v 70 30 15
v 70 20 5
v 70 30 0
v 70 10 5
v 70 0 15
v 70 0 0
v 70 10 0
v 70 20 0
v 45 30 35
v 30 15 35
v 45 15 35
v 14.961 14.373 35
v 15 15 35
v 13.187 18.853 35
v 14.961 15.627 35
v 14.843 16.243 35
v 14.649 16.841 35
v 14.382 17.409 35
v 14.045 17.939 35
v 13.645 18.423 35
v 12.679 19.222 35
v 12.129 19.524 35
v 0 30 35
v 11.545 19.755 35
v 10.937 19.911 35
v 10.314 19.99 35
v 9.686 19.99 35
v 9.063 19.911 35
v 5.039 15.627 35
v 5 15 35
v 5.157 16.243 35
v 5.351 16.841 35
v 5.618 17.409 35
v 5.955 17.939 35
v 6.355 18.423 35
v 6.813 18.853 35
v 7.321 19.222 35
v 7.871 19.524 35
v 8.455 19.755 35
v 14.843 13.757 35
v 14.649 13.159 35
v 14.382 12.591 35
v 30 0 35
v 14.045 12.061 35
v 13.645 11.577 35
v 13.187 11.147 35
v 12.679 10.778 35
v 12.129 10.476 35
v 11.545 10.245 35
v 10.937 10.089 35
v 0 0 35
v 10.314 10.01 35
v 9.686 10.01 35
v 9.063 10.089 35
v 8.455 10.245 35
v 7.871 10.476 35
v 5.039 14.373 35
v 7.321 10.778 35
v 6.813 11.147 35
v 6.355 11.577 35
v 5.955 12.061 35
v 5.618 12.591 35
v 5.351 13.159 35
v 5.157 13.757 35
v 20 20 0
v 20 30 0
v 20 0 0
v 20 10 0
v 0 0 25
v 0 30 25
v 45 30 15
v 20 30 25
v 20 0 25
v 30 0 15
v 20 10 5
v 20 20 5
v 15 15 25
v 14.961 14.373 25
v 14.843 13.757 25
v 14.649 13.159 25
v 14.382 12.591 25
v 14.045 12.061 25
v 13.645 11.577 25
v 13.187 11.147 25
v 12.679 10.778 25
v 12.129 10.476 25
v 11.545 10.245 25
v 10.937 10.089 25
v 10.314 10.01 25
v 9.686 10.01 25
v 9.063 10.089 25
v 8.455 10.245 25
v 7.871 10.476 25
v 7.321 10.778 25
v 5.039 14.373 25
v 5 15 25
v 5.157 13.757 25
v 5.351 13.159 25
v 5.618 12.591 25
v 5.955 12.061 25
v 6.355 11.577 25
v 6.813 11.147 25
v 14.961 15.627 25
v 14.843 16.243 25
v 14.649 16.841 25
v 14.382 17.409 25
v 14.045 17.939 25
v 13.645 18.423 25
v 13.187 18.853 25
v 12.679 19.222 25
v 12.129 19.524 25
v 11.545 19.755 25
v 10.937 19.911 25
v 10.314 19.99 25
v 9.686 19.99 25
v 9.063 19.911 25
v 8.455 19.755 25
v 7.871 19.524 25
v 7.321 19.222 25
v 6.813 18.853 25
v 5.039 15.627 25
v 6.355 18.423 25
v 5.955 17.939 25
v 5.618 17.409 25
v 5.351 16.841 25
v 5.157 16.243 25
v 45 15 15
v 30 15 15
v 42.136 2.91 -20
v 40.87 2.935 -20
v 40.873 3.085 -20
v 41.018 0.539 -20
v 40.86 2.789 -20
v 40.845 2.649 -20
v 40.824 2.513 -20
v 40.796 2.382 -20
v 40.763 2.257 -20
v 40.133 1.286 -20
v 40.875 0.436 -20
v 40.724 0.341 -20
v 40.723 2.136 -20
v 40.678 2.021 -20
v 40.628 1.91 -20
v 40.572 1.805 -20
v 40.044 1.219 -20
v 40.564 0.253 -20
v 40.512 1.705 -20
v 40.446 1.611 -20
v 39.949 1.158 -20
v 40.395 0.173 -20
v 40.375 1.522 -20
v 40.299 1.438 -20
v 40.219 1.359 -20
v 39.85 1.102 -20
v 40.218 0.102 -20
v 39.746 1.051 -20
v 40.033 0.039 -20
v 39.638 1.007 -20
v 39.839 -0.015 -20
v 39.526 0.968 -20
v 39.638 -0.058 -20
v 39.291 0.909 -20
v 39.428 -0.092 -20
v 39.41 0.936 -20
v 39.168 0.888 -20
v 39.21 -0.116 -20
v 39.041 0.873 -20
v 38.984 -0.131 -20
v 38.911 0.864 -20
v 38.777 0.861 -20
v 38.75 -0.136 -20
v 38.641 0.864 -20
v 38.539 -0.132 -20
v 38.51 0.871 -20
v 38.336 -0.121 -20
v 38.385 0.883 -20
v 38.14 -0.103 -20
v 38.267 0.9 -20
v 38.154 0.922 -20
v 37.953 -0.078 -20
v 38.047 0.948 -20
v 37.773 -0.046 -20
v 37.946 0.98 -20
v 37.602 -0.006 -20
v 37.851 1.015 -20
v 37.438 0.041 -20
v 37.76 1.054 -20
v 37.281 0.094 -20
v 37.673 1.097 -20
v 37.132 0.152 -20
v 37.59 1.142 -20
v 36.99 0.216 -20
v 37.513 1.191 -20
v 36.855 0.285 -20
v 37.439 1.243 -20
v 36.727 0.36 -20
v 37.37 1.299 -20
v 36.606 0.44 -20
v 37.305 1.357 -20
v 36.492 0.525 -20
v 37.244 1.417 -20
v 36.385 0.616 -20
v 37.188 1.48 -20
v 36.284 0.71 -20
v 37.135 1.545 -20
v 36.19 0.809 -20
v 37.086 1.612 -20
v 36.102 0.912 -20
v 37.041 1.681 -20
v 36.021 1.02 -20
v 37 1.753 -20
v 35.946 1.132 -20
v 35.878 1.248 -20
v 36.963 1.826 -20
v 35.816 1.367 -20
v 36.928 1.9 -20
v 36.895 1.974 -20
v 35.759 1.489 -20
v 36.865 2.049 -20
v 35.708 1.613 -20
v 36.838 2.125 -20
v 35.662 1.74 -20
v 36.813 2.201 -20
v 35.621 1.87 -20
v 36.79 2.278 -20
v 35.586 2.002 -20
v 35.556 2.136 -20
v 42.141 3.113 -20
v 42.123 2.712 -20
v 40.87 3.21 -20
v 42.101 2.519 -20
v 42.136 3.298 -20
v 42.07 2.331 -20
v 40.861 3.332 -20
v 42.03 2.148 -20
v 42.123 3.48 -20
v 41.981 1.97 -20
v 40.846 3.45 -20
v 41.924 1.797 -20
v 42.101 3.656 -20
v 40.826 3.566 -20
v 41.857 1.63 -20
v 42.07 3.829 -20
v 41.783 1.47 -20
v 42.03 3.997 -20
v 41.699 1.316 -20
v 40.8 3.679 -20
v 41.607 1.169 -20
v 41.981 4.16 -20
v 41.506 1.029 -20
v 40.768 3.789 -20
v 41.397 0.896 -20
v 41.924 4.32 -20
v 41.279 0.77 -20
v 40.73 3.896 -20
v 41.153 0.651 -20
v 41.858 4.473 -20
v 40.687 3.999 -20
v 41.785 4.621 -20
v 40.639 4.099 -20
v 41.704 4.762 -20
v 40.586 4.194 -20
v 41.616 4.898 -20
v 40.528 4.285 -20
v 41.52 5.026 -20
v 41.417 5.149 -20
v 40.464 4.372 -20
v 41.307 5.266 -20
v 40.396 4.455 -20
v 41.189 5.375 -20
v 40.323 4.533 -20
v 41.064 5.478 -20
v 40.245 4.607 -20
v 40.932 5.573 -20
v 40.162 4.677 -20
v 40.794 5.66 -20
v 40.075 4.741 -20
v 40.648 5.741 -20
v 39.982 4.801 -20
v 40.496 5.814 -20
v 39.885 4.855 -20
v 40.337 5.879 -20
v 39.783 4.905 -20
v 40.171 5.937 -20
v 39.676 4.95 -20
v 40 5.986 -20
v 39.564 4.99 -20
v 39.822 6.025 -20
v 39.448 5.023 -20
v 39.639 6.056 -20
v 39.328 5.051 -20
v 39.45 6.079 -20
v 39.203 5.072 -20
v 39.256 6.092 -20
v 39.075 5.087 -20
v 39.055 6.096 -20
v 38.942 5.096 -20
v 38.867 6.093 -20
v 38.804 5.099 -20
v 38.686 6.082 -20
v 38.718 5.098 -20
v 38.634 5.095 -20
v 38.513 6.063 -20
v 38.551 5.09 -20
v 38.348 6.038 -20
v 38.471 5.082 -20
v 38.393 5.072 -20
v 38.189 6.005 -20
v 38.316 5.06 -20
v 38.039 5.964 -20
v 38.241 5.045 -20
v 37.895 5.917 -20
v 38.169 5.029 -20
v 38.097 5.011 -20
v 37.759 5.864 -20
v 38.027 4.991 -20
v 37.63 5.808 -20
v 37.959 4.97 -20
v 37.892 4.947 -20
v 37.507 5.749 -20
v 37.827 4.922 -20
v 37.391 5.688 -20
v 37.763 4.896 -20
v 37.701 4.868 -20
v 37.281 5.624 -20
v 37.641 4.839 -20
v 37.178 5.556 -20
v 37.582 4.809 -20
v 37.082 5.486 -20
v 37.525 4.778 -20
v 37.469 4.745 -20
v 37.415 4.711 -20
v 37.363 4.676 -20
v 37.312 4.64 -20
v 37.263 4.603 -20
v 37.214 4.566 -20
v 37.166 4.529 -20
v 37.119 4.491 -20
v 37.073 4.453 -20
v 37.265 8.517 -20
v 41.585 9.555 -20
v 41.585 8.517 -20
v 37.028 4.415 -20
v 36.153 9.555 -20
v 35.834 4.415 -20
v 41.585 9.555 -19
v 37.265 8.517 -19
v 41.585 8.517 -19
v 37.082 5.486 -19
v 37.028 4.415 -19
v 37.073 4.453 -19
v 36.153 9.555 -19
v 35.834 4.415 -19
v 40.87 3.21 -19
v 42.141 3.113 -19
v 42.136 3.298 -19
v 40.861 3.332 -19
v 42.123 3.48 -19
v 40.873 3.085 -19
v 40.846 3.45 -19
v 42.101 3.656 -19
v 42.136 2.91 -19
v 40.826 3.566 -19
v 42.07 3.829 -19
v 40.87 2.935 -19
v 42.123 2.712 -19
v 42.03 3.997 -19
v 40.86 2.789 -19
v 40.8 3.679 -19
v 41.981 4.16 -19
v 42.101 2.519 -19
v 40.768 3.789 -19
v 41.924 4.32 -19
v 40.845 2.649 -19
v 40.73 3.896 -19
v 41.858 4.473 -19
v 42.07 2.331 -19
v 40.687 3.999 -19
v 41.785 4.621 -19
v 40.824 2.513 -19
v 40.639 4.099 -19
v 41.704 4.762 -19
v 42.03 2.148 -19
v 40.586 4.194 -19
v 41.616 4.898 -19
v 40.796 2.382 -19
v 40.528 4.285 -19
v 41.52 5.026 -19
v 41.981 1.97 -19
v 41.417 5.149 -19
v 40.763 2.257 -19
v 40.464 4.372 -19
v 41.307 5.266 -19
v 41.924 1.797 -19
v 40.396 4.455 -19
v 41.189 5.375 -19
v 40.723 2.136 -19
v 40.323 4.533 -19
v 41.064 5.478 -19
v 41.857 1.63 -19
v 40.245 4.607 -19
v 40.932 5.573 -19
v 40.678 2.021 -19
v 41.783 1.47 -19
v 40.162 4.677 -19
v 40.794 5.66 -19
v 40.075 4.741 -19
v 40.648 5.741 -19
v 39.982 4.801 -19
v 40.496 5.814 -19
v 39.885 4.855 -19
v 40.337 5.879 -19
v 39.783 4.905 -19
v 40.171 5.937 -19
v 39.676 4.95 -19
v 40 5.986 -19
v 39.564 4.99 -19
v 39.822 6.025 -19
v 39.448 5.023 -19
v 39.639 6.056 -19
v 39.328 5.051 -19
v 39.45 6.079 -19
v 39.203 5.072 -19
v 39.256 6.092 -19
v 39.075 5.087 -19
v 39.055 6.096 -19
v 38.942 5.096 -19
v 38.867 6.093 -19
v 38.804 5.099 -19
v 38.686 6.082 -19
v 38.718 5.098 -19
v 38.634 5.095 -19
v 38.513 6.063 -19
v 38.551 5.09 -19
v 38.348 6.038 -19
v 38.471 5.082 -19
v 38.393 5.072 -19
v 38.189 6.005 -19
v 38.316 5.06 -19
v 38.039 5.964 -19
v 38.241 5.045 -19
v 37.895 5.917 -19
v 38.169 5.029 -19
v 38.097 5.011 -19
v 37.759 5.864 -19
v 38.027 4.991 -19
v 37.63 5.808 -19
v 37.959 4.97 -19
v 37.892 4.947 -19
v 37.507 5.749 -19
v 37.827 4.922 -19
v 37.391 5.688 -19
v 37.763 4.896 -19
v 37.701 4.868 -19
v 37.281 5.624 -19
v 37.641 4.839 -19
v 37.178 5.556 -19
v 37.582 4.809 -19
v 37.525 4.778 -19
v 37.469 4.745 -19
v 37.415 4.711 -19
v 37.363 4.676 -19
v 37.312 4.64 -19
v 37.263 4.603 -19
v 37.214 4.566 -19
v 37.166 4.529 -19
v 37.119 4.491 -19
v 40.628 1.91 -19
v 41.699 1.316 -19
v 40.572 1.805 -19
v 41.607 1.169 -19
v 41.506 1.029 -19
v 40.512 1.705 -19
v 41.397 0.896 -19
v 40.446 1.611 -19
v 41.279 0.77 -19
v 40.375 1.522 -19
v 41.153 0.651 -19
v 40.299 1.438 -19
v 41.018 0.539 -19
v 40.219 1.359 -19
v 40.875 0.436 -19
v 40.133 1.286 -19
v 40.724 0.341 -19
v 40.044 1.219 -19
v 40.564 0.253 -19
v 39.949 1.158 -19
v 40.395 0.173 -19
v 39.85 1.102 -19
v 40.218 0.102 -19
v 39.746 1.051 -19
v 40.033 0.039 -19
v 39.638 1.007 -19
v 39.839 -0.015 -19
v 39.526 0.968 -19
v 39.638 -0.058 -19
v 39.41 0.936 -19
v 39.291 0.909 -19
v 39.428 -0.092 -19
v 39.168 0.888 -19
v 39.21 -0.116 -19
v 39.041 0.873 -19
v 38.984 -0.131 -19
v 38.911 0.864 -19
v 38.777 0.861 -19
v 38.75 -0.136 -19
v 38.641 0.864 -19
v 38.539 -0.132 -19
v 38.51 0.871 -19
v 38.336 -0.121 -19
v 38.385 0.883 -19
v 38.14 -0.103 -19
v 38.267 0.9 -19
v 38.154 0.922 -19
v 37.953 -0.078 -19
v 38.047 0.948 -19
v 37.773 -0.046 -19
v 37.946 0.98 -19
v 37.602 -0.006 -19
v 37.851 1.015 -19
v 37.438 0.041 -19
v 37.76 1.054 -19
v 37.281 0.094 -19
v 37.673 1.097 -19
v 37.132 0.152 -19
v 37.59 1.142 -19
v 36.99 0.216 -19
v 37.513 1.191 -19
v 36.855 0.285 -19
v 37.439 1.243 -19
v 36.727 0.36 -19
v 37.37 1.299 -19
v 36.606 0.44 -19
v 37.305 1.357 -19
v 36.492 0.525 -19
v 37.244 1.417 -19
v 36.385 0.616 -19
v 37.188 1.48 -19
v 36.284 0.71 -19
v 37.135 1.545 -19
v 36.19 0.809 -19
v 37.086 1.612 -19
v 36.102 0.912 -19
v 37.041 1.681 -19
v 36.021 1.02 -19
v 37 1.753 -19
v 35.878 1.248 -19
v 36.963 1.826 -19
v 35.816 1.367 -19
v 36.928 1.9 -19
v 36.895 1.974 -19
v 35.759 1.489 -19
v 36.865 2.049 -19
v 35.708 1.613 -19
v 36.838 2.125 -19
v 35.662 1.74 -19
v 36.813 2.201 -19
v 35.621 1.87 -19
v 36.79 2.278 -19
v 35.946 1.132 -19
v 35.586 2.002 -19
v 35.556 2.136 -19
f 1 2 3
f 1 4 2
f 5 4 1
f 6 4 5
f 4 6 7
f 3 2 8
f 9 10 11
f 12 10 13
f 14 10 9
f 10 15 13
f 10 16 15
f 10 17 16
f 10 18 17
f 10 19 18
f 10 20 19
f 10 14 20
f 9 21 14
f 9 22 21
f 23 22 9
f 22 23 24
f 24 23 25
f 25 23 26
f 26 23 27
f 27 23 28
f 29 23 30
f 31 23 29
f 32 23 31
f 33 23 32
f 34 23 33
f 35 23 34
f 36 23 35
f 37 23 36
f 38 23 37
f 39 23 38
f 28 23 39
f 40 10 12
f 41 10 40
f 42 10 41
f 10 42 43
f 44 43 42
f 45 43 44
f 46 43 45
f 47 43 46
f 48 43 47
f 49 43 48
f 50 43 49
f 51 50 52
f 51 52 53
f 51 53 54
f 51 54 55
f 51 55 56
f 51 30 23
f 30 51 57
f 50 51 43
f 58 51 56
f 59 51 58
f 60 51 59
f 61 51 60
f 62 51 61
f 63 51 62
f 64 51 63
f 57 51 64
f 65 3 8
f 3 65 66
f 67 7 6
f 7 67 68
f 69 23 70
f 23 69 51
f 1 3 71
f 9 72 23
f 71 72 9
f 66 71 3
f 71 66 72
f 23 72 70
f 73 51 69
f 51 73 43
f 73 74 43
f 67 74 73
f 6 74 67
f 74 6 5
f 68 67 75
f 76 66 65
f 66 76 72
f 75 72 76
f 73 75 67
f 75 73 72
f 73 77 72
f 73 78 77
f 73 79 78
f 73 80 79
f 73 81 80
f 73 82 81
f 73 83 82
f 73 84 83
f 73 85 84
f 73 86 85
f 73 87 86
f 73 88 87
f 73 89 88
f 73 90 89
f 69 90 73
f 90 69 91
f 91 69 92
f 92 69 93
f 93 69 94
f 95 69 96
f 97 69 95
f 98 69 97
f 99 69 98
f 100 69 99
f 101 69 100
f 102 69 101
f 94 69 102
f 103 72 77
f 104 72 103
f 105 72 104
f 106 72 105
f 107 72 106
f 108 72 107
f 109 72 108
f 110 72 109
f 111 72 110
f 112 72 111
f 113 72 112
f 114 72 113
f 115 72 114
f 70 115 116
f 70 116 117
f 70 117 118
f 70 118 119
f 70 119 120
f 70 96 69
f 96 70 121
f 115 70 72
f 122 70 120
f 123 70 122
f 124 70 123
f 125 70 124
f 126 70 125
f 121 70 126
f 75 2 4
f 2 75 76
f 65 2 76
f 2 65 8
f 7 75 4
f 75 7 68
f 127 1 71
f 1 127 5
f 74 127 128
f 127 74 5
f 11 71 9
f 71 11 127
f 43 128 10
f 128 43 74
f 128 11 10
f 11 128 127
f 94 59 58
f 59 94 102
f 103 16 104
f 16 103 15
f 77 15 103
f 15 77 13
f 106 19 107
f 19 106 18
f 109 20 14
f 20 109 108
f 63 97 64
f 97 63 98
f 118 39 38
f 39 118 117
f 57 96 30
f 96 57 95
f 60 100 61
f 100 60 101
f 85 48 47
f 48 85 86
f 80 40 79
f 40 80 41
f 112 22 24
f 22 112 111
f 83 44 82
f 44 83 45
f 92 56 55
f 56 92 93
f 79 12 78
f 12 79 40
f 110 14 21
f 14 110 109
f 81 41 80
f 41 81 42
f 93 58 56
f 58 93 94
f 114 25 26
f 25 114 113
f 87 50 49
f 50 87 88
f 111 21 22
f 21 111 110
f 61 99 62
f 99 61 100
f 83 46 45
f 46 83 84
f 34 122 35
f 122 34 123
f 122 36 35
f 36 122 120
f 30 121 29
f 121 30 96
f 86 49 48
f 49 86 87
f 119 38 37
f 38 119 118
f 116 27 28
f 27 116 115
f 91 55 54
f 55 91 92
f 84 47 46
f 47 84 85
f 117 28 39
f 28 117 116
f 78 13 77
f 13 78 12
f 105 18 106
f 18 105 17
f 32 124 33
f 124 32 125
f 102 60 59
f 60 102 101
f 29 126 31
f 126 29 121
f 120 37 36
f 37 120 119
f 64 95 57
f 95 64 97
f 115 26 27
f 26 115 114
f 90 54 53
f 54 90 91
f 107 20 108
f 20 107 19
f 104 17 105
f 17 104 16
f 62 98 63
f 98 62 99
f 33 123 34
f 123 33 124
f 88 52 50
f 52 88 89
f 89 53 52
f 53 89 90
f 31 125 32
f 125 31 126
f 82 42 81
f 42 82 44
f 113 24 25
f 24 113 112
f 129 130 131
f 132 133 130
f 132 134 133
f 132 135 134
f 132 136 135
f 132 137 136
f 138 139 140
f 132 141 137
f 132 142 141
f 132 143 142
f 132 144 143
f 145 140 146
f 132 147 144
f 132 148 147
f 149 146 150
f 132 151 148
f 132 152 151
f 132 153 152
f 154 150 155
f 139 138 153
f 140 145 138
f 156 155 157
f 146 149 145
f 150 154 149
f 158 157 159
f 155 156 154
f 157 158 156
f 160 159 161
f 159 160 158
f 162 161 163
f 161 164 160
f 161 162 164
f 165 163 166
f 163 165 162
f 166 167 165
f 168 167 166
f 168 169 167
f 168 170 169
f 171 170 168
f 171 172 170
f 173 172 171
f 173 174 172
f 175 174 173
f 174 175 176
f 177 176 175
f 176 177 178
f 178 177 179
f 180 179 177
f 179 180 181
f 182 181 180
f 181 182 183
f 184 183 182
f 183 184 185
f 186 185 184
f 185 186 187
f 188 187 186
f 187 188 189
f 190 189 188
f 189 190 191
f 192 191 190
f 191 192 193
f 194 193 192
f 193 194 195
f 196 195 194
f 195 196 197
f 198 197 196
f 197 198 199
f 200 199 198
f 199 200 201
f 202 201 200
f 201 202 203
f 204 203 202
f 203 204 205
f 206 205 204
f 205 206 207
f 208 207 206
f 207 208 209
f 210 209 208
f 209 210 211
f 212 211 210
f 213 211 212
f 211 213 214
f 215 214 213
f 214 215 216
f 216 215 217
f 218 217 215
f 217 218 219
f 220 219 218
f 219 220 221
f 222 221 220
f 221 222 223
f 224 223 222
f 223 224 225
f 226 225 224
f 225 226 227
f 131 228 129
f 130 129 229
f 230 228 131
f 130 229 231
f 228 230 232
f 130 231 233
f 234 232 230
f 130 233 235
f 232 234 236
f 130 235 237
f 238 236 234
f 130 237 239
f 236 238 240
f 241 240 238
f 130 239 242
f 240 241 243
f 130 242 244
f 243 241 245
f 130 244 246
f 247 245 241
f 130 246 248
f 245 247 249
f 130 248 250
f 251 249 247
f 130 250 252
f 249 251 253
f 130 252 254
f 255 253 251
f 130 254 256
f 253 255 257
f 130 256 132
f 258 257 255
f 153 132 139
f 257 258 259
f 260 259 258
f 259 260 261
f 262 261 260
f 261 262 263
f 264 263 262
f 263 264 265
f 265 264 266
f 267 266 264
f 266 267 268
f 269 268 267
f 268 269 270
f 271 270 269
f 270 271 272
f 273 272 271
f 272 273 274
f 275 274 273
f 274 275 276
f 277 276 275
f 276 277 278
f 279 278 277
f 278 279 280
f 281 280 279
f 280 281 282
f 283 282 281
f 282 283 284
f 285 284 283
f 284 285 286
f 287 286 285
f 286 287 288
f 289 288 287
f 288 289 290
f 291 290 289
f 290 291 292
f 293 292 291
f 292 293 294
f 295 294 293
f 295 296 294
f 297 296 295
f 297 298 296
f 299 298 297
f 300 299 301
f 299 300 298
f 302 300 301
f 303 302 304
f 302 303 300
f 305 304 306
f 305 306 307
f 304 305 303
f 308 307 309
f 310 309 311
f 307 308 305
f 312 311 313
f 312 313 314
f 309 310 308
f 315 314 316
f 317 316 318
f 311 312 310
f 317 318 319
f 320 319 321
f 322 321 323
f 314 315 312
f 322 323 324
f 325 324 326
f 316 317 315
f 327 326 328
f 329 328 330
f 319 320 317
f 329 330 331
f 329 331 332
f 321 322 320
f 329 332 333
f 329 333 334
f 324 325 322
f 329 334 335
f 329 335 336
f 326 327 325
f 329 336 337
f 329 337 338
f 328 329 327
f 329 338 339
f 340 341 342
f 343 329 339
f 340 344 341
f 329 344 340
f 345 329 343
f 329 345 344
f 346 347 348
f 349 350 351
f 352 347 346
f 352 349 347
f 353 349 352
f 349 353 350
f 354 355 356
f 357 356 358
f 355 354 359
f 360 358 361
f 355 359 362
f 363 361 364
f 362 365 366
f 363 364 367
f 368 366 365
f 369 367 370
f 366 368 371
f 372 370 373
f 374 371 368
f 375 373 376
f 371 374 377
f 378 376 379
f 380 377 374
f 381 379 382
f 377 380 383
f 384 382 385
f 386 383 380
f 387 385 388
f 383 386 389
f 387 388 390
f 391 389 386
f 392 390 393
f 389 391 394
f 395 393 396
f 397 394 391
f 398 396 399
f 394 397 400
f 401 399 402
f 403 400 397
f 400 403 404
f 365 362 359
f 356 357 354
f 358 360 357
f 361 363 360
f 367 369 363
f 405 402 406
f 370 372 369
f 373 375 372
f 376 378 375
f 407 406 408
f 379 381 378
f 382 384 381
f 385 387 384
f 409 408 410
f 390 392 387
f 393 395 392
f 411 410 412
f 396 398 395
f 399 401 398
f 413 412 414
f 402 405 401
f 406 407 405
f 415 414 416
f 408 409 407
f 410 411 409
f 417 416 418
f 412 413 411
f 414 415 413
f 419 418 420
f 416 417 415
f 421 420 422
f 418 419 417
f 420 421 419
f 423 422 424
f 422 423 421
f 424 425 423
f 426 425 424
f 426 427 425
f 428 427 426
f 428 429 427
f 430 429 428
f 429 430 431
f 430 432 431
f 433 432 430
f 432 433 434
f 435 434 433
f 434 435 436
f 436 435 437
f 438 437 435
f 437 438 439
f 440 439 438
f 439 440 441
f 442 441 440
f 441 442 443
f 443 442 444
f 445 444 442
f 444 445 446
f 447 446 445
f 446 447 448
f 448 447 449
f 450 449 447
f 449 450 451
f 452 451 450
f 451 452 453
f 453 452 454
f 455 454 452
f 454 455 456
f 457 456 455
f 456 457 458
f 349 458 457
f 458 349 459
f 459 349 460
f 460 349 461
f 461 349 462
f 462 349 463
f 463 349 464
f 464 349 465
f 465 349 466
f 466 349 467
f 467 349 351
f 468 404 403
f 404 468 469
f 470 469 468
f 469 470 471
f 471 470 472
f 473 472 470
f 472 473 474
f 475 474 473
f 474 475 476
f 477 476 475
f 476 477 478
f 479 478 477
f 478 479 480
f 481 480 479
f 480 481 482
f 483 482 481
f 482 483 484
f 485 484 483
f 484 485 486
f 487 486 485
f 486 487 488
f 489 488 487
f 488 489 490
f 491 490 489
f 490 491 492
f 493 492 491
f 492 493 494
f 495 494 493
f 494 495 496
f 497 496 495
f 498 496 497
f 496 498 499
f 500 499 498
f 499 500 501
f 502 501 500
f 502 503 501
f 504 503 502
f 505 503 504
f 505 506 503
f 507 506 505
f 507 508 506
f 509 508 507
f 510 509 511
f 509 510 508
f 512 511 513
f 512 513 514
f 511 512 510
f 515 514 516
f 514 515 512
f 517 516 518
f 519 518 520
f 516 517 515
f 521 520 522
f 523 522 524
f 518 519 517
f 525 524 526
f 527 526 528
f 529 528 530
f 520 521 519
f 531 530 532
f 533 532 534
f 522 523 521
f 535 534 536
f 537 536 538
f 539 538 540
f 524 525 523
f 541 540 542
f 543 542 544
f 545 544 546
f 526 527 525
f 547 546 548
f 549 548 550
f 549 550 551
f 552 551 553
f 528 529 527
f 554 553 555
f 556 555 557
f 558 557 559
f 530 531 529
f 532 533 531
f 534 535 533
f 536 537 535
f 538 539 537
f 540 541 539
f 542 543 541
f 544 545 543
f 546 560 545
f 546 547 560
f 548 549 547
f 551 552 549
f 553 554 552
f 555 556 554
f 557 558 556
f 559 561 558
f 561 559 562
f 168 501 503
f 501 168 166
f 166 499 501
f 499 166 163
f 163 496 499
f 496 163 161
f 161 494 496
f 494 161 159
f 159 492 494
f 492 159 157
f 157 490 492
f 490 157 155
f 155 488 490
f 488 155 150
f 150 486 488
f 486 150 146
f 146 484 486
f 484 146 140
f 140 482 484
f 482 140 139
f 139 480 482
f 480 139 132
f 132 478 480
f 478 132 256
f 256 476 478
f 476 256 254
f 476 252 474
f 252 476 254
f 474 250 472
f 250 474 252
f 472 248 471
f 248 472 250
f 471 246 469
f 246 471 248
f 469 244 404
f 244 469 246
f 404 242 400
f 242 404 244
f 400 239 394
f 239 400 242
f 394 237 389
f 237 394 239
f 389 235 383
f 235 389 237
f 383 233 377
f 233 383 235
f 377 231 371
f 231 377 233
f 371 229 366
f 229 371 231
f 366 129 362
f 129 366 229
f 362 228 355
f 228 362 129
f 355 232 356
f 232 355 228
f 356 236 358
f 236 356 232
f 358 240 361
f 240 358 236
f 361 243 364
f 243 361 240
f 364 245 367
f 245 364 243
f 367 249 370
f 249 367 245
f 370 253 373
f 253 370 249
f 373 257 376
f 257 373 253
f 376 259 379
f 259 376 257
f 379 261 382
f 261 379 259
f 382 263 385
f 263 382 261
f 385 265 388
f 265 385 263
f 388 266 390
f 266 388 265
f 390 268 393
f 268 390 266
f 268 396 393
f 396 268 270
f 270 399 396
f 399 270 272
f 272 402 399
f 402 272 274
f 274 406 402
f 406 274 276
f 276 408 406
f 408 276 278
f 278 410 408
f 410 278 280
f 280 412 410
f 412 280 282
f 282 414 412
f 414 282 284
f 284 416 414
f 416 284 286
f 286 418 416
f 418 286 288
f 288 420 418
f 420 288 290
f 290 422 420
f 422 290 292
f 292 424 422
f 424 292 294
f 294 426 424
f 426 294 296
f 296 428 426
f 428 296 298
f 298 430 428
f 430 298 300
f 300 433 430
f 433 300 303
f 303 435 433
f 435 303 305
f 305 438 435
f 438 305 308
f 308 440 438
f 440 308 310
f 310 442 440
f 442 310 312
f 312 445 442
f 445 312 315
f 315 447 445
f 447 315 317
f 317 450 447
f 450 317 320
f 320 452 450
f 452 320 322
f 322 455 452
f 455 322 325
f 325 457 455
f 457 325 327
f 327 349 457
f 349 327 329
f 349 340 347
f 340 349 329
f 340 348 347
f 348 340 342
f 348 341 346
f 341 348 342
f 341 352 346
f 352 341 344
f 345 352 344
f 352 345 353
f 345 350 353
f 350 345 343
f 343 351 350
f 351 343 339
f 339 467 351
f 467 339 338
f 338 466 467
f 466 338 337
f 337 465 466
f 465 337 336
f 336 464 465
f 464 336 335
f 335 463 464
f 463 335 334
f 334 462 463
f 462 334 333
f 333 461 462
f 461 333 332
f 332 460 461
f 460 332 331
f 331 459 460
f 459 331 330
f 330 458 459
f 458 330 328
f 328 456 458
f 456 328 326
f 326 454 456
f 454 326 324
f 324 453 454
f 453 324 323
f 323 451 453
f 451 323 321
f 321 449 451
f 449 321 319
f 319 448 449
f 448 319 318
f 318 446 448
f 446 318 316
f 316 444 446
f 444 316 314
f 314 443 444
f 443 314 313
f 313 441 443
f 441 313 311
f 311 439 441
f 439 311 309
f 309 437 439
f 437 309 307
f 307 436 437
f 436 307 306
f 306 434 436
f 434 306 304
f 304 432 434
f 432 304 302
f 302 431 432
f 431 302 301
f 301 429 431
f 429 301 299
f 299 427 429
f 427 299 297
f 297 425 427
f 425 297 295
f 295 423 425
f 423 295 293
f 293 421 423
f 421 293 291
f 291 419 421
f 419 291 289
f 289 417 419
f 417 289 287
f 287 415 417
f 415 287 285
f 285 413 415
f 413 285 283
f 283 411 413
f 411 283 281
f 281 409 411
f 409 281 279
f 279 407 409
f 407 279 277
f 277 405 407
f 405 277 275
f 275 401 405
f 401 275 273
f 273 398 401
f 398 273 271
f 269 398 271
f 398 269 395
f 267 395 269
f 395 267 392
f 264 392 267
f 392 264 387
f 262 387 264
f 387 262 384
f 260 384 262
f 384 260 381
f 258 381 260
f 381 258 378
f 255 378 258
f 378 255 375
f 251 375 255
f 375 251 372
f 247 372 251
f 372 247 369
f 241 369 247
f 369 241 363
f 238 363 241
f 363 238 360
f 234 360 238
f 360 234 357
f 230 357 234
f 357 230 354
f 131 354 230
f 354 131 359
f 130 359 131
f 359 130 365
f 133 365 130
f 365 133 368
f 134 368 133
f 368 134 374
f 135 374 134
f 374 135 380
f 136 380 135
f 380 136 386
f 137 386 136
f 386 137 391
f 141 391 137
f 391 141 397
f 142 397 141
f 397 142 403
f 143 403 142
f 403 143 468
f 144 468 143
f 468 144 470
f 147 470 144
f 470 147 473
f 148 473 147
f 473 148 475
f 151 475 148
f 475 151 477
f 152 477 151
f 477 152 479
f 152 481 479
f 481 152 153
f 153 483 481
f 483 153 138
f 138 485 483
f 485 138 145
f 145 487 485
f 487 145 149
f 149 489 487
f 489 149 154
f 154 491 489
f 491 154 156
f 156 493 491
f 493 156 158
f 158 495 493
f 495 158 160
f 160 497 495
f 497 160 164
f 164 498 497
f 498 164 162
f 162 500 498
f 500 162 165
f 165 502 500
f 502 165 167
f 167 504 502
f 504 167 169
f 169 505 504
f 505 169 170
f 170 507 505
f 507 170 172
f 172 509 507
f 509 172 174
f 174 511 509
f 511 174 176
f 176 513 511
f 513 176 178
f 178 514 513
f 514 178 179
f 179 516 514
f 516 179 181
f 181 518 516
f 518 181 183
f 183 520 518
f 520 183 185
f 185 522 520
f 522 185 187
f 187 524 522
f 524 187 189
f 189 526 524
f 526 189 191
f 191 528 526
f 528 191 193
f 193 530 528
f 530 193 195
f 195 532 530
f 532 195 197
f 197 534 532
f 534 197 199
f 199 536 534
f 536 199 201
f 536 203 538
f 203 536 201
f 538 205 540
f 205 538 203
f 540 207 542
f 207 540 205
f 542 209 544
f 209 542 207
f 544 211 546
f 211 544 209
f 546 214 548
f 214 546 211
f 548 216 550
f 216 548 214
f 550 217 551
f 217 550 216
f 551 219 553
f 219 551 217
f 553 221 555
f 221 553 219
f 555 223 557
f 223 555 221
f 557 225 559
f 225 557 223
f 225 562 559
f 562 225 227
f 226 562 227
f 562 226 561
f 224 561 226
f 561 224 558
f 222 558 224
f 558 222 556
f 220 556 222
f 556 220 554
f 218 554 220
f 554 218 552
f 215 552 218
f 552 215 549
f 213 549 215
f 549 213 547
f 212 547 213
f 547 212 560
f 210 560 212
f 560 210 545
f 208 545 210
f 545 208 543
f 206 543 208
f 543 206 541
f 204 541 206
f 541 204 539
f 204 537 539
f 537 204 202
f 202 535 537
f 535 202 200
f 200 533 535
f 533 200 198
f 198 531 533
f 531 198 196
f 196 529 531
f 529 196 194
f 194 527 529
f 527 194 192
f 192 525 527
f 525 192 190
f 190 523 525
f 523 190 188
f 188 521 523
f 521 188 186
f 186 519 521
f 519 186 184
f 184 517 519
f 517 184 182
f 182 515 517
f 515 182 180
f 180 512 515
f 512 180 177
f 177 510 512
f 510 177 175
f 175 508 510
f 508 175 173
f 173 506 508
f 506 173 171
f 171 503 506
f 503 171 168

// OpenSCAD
$fn=50;

cw=70;
cd=30;
ch=35;
cy=10;

difference() {
    cube([cw,cd,ch]);
    cube([20,cd,ch-10]);
    translate([0,10,0])
    cube([cw,10,5]);
    translate([cw-25,0,15])
    cube([25,cd,20]);
    translate([30,0,15])
    cube([20,15,ch-15]);
    translate([10,cd/2,ch-cy])
    cylinder(h=cy,d=cy);
}
translate([cw/2,0,-20])
linear_extrude(height=1)
text("5");
